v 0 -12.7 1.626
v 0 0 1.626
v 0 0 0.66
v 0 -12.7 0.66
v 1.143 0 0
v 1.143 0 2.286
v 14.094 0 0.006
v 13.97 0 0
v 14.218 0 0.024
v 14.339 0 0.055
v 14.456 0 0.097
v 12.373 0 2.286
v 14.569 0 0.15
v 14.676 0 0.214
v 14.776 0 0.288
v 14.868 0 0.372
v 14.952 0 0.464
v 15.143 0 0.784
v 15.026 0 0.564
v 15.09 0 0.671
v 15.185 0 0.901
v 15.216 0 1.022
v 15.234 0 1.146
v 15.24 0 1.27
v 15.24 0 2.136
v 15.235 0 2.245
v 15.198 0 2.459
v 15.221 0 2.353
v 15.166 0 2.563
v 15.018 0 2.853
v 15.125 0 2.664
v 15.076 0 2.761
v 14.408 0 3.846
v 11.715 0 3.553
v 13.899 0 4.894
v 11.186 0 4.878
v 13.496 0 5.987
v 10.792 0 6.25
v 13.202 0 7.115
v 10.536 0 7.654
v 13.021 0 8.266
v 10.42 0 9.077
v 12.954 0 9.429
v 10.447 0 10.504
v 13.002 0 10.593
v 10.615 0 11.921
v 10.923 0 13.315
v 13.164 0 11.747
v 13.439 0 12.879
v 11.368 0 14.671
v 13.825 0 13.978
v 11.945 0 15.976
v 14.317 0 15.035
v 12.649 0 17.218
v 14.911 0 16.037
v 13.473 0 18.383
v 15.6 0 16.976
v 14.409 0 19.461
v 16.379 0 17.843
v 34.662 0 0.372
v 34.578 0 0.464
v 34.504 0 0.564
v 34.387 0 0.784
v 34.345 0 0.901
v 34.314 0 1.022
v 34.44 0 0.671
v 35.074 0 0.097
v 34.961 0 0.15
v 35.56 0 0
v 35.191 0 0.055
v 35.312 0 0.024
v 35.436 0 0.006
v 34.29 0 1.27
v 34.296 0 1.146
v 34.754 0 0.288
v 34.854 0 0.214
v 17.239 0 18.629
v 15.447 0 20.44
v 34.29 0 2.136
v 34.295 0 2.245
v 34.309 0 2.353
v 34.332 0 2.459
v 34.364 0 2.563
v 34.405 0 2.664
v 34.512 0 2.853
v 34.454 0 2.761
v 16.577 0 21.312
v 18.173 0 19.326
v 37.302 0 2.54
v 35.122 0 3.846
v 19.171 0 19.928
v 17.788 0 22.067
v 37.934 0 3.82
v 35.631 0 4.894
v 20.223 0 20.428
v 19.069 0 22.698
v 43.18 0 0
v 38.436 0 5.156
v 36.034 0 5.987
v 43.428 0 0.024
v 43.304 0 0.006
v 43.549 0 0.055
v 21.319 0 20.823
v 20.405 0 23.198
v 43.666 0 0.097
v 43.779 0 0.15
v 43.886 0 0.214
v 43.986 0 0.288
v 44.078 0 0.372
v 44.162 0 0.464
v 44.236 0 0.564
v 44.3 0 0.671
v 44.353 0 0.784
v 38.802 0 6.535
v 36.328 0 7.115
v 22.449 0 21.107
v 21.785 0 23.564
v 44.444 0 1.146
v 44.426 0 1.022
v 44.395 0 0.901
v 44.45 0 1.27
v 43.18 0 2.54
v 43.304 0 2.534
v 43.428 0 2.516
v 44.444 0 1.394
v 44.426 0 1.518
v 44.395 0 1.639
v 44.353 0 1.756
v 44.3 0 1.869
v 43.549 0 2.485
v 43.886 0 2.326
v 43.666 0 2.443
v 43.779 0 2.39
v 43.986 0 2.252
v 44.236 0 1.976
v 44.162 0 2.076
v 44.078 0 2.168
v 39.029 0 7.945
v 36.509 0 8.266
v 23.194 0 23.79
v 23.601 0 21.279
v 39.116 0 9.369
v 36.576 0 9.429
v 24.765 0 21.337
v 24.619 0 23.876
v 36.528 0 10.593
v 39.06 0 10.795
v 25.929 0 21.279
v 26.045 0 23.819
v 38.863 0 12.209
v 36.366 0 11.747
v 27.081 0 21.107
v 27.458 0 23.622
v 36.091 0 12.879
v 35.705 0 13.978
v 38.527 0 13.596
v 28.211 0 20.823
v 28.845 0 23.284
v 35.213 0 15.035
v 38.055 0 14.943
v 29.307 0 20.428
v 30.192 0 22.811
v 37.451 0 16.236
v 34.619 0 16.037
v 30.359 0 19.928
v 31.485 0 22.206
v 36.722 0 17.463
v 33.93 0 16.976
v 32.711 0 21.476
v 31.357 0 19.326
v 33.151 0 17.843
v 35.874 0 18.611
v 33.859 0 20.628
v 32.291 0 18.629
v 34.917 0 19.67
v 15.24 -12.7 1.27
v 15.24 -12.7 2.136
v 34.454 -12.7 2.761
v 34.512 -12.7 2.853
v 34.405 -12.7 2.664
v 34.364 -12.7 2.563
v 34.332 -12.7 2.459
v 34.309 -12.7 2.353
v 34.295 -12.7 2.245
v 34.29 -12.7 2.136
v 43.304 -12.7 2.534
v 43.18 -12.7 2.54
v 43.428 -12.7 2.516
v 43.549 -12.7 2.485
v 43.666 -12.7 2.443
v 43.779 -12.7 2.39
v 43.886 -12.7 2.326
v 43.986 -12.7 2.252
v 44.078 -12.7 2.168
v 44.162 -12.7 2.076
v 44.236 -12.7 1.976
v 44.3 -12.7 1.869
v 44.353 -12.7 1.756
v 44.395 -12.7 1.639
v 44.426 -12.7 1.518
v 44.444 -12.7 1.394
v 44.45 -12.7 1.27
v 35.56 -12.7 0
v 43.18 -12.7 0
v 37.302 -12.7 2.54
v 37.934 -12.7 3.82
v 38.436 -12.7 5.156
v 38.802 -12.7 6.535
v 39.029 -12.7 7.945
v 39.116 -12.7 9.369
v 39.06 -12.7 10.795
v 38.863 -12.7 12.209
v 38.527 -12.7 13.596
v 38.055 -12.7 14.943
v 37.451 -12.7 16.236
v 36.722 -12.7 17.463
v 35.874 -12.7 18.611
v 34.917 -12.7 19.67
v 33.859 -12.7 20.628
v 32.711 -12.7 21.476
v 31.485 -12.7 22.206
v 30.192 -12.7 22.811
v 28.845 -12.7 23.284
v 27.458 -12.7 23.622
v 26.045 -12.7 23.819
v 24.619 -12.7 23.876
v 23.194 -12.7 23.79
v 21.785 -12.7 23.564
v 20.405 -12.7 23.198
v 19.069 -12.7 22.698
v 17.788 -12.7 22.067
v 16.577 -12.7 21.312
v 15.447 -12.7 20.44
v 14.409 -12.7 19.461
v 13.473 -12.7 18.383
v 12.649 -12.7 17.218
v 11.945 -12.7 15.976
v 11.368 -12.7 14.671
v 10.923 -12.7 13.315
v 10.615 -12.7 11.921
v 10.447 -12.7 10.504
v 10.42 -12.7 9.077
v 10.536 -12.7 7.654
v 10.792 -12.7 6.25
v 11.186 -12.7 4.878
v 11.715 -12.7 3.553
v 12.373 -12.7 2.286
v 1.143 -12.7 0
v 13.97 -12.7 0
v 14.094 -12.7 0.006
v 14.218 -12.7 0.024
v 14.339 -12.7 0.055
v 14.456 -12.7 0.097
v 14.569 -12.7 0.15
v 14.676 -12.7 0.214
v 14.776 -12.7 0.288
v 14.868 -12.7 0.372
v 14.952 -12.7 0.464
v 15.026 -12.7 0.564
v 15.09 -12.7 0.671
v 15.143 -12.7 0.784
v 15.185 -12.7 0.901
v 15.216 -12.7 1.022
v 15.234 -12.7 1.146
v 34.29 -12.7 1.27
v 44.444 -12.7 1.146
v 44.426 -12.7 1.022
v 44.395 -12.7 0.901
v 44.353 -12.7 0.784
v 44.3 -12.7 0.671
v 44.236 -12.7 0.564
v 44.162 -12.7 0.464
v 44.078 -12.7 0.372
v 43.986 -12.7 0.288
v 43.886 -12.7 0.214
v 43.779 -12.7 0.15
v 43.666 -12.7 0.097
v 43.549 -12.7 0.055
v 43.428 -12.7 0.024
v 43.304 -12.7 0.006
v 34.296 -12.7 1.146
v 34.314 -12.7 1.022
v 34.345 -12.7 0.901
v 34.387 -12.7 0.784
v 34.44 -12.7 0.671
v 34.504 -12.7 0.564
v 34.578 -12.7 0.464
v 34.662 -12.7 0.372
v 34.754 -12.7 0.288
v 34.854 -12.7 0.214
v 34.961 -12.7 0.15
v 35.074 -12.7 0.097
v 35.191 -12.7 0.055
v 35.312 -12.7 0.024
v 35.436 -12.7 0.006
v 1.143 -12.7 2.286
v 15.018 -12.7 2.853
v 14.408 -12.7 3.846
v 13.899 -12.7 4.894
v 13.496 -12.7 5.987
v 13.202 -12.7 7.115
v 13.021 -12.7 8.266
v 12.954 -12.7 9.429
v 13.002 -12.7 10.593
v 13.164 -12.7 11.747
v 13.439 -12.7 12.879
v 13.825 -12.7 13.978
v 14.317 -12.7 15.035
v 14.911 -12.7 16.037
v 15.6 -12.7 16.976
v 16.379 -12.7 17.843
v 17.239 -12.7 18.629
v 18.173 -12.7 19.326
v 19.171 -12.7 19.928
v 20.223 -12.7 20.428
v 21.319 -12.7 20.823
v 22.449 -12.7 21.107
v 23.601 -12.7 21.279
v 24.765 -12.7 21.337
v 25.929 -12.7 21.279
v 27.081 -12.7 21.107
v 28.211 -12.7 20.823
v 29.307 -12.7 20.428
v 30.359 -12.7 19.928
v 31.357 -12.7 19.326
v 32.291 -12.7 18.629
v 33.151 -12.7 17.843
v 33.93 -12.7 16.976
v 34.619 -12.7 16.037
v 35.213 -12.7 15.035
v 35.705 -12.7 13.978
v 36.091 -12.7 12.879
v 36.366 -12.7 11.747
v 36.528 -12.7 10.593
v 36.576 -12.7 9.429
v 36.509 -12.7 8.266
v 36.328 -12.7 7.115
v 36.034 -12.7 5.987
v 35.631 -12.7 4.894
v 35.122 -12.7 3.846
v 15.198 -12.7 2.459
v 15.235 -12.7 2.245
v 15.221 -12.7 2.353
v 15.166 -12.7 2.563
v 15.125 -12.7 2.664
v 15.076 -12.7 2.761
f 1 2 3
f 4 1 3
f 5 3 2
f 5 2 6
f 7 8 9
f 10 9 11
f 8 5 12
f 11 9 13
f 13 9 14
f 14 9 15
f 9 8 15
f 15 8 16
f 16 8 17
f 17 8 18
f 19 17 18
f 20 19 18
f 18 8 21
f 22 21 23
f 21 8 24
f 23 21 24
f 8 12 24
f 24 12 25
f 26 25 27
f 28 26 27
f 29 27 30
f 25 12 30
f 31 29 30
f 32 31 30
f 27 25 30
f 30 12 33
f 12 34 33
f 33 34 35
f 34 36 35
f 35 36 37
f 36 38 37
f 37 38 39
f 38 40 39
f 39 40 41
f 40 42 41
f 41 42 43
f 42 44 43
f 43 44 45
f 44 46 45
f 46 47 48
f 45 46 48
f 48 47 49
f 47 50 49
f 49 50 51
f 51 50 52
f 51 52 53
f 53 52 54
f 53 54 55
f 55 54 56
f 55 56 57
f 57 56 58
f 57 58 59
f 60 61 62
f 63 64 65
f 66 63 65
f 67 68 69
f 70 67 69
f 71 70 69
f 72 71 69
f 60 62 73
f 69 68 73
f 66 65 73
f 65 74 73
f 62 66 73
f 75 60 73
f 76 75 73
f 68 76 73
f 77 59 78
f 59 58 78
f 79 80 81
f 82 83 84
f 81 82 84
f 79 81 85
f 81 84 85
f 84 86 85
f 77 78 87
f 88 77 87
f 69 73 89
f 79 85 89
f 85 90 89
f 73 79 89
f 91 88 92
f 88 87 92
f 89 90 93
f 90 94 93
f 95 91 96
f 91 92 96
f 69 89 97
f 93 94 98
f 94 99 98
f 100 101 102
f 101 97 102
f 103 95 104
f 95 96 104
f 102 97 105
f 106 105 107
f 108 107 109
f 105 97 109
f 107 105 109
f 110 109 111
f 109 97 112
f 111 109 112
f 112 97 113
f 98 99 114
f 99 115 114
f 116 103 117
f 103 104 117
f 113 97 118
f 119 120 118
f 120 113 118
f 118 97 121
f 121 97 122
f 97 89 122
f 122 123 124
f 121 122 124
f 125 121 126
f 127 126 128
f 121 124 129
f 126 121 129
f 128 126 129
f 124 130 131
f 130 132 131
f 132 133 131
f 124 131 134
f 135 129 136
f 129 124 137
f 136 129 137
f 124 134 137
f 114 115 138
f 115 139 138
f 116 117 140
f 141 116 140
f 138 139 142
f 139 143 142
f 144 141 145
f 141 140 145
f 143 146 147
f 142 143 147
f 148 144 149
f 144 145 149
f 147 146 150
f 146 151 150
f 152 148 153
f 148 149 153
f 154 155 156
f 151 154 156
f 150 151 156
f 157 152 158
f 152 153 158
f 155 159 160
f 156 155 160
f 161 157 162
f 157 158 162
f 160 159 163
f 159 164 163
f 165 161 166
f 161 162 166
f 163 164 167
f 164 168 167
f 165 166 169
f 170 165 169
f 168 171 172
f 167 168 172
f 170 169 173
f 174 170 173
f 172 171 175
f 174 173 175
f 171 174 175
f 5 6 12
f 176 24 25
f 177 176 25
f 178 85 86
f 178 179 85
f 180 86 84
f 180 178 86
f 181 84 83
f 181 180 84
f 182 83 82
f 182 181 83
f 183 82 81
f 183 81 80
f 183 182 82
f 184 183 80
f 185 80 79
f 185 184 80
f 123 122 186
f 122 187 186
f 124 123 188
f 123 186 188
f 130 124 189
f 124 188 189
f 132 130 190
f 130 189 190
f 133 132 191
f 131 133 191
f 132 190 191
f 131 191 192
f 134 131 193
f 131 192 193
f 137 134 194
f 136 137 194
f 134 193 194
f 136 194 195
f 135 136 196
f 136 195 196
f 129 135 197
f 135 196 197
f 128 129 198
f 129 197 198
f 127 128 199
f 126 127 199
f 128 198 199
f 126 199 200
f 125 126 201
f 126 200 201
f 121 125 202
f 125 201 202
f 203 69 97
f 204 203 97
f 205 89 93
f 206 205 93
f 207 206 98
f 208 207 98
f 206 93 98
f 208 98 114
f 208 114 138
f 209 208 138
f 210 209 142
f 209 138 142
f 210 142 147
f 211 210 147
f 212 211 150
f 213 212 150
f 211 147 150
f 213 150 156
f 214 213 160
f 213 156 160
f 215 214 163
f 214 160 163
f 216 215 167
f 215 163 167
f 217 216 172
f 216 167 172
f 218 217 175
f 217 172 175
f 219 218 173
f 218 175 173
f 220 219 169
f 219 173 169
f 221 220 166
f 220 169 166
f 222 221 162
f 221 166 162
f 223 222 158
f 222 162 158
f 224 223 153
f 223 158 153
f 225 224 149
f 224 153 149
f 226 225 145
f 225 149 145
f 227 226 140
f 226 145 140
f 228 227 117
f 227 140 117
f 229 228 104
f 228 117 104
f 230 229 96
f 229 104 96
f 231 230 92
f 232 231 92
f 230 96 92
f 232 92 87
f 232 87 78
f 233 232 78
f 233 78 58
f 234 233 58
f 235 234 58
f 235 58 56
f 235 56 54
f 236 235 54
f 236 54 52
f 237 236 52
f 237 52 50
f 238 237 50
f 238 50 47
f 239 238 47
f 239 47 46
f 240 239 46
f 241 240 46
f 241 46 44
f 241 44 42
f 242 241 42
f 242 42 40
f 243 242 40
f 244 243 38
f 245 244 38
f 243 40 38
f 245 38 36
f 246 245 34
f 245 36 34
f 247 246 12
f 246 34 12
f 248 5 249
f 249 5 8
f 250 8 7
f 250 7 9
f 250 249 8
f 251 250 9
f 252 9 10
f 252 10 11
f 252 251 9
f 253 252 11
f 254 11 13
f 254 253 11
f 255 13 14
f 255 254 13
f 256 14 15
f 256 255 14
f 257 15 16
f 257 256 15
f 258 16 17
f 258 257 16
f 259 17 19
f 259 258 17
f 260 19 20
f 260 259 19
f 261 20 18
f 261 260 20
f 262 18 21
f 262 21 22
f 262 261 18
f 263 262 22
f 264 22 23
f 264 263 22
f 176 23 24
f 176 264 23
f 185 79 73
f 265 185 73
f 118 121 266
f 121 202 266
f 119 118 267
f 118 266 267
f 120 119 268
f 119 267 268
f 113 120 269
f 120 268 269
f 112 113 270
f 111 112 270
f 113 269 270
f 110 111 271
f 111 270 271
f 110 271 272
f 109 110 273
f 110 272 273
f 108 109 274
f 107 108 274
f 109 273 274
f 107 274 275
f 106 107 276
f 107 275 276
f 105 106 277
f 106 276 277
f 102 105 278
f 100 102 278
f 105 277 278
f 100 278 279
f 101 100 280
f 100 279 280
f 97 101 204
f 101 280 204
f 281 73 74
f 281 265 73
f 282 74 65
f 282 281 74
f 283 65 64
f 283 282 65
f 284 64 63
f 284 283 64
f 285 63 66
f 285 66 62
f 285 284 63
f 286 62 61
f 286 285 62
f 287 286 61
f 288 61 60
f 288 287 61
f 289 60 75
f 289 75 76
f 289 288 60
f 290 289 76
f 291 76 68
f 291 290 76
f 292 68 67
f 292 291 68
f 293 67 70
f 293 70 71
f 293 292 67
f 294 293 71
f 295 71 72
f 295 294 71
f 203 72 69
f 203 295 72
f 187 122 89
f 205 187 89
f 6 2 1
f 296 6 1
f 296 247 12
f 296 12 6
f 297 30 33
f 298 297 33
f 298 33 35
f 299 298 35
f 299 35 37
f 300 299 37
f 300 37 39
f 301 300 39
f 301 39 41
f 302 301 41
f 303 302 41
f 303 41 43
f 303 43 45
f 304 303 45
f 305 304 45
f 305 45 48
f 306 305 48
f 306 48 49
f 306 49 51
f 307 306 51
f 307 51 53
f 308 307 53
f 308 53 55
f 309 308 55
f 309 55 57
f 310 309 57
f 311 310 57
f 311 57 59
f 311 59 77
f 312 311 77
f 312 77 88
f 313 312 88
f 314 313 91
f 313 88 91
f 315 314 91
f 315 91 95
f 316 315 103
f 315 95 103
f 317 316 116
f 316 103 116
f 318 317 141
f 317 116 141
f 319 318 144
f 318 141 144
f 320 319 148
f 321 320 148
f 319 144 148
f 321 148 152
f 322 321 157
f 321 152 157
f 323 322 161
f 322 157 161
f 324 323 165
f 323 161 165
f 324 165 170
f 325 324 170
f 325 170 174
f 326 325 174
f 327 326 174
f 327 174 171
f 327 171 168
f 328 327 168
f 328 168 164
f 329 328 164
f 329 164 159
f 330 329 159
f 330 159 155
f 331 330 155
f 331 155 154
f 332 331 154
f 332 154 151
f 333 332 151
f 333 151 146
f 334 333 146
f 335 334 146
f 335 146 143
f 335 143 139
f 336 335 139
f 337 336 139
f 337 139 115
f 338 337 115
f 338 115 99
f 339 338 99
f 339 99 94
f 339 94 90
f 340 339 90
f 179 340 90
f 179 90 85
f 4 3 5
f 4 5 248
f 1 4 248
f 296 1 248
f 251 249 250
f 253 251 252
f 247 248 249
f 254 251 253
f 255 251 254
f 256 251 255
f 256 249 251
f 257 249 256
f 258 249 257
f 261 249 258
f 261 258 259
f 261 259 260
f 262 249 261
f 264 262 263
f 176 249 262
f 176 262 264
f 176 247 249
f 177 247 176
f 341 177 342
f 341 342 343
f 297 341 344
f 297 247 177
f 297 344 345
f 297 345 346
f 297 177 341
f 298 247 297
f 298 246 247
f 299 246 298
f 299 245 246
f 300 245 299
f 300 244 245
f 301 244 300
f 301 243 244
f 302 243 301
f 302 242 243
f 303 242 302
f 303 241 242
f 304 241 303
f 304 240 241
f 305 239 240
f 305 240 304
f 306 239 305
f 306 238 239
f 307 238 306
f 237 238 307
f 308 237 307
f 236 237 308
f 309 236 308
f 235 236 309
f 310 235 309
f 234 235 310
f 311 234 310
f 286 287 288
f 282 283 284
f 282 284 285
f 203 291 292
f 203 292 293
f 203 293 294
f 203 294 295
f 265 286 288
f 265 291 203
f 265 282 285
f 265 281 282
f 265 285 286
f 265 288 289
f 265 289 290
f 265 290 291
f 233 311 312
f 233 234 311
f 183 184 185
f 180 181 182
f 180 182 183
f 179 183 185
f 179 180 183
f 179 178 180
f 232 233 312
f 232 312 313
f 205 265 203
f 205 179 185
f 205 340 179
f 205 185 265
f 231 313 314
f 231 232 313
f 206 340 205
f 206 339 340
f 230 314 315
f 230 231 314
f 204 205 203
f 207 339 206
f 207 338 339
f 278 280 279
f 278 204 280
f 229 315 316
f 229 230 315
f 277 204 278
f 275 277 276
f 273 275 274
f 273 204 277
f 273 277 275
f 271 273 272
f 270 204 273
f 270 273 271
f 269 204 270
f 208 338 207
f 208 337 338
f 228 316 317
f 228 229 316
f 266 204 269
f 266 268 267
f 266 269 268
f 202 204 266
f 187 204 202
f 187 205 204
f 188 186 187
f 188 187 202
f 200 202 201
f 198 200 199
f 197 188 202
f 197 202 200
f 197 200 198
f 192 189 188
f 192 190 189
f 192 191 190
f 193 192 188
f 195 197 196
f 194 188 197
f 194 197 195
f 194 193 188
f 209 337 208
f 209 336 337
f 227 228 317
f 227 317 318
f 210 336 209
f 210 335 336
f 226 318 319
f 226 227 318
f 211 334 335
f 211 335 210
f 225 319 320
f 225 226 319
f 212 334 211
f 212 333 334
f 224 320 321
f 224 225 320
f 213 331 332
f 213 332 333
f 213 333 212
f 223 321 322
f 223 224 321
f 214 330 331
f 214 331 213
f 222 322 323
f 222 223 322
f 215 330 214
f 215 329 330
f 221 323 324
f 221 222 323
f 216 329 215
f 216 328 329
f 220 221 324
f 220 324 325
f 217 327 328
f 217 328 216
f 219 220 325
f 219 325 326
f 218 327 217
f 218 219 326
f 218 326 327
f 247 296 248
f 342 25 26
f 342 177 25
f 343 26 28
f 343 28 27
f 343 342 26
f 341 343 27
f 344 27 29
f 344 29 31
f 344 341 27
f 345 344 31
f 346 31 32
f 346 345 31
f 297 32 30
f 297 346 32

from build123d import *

# Parameters (mm, degrees)
F1_DEPTH   = 12.7
F2_SIZE2   = 0.6599113577
F2_SIZE    = 1.143
F2_2_SIZE2 = 0.6599113577
F2_2_SIZE  = 1.143
F3_R       = 1.26999


# Not quite as in the source:
# - a fillet or chamfer is up to 0.001 mm smaller than in the source, because OpenCascade refuses the exact size


with BuildPart() as f1:
    # F0 (on Front) → F1 (new body)
    with BuildSketch(Plane.XZ):
        with BuildLine():
            Line((0, 2.286), (0, 0))
            Line((0, 0), (15.24, 0))
            Line((15.24, 0), (15.24, 2.54))
            ThreePointArc((15.24, 2.54), (24.765, 21.336682776), (34.29, 2.54))
            Line((34.29, 2.54), (34.29, 0))
            Line((34.29, 0), (44.45, 0))
            Line((44.45, 0), (44.45, 2.54))
            Line((44.45, 2.54), (37.3021676826, 2.54))
            ThreePointArc((37.3021676826, 2.54), (24.6187816105, 23.8759379026), (12.3727573659, 2.286))
            Line((12.3727573659, 2.286), (0, 2.286))
        make_face()
    extrude(amount=F1_DEPTH)

    # F2
    f2_edges = [f1.edges().sort_by_distance(p)[0] for p in [
        (0, -6.35, 0),
    ]]
    f2_side = f1.faces().sort_by_distance((7.62, -6.35, 0))[0]
    chamfer(f2_edges, length=F2_SIZE, length2=F2_SIZE2, reference=f2_side)

    # F2#2
    f2_2_edges = [f1.edges().sort_by_distance(p)[0] for p in [
        (0, -6.35, 2.286),
    ]]
    f2_2_side = f1.faces().sort_by_distance((6.186379, -6.35, 2.286))[0]
    chamfer(f2_2_edges, length=F2_2_SIZE, length2=F2_2_SIZE2, reference=f2_2_side)

    # F3 (radius 1.27 in the source; OpenCascade refuses exactly that, so slightly less here)
    f3_edges = [f1.edges().sort_by_distance(p)[0] for p in [
        (44.45, -6.35, 2.54),
        (44.45, -6.35, 0),
        (34.29, -6.35, 0),
        (34.29, -6.35, 2.54),
        (15.24, -6.35, 2.54),
        (15.24, -6.35, 0),
    ]]
    fillet(f3_edges, radius=F3_R)


solid = f1.part
